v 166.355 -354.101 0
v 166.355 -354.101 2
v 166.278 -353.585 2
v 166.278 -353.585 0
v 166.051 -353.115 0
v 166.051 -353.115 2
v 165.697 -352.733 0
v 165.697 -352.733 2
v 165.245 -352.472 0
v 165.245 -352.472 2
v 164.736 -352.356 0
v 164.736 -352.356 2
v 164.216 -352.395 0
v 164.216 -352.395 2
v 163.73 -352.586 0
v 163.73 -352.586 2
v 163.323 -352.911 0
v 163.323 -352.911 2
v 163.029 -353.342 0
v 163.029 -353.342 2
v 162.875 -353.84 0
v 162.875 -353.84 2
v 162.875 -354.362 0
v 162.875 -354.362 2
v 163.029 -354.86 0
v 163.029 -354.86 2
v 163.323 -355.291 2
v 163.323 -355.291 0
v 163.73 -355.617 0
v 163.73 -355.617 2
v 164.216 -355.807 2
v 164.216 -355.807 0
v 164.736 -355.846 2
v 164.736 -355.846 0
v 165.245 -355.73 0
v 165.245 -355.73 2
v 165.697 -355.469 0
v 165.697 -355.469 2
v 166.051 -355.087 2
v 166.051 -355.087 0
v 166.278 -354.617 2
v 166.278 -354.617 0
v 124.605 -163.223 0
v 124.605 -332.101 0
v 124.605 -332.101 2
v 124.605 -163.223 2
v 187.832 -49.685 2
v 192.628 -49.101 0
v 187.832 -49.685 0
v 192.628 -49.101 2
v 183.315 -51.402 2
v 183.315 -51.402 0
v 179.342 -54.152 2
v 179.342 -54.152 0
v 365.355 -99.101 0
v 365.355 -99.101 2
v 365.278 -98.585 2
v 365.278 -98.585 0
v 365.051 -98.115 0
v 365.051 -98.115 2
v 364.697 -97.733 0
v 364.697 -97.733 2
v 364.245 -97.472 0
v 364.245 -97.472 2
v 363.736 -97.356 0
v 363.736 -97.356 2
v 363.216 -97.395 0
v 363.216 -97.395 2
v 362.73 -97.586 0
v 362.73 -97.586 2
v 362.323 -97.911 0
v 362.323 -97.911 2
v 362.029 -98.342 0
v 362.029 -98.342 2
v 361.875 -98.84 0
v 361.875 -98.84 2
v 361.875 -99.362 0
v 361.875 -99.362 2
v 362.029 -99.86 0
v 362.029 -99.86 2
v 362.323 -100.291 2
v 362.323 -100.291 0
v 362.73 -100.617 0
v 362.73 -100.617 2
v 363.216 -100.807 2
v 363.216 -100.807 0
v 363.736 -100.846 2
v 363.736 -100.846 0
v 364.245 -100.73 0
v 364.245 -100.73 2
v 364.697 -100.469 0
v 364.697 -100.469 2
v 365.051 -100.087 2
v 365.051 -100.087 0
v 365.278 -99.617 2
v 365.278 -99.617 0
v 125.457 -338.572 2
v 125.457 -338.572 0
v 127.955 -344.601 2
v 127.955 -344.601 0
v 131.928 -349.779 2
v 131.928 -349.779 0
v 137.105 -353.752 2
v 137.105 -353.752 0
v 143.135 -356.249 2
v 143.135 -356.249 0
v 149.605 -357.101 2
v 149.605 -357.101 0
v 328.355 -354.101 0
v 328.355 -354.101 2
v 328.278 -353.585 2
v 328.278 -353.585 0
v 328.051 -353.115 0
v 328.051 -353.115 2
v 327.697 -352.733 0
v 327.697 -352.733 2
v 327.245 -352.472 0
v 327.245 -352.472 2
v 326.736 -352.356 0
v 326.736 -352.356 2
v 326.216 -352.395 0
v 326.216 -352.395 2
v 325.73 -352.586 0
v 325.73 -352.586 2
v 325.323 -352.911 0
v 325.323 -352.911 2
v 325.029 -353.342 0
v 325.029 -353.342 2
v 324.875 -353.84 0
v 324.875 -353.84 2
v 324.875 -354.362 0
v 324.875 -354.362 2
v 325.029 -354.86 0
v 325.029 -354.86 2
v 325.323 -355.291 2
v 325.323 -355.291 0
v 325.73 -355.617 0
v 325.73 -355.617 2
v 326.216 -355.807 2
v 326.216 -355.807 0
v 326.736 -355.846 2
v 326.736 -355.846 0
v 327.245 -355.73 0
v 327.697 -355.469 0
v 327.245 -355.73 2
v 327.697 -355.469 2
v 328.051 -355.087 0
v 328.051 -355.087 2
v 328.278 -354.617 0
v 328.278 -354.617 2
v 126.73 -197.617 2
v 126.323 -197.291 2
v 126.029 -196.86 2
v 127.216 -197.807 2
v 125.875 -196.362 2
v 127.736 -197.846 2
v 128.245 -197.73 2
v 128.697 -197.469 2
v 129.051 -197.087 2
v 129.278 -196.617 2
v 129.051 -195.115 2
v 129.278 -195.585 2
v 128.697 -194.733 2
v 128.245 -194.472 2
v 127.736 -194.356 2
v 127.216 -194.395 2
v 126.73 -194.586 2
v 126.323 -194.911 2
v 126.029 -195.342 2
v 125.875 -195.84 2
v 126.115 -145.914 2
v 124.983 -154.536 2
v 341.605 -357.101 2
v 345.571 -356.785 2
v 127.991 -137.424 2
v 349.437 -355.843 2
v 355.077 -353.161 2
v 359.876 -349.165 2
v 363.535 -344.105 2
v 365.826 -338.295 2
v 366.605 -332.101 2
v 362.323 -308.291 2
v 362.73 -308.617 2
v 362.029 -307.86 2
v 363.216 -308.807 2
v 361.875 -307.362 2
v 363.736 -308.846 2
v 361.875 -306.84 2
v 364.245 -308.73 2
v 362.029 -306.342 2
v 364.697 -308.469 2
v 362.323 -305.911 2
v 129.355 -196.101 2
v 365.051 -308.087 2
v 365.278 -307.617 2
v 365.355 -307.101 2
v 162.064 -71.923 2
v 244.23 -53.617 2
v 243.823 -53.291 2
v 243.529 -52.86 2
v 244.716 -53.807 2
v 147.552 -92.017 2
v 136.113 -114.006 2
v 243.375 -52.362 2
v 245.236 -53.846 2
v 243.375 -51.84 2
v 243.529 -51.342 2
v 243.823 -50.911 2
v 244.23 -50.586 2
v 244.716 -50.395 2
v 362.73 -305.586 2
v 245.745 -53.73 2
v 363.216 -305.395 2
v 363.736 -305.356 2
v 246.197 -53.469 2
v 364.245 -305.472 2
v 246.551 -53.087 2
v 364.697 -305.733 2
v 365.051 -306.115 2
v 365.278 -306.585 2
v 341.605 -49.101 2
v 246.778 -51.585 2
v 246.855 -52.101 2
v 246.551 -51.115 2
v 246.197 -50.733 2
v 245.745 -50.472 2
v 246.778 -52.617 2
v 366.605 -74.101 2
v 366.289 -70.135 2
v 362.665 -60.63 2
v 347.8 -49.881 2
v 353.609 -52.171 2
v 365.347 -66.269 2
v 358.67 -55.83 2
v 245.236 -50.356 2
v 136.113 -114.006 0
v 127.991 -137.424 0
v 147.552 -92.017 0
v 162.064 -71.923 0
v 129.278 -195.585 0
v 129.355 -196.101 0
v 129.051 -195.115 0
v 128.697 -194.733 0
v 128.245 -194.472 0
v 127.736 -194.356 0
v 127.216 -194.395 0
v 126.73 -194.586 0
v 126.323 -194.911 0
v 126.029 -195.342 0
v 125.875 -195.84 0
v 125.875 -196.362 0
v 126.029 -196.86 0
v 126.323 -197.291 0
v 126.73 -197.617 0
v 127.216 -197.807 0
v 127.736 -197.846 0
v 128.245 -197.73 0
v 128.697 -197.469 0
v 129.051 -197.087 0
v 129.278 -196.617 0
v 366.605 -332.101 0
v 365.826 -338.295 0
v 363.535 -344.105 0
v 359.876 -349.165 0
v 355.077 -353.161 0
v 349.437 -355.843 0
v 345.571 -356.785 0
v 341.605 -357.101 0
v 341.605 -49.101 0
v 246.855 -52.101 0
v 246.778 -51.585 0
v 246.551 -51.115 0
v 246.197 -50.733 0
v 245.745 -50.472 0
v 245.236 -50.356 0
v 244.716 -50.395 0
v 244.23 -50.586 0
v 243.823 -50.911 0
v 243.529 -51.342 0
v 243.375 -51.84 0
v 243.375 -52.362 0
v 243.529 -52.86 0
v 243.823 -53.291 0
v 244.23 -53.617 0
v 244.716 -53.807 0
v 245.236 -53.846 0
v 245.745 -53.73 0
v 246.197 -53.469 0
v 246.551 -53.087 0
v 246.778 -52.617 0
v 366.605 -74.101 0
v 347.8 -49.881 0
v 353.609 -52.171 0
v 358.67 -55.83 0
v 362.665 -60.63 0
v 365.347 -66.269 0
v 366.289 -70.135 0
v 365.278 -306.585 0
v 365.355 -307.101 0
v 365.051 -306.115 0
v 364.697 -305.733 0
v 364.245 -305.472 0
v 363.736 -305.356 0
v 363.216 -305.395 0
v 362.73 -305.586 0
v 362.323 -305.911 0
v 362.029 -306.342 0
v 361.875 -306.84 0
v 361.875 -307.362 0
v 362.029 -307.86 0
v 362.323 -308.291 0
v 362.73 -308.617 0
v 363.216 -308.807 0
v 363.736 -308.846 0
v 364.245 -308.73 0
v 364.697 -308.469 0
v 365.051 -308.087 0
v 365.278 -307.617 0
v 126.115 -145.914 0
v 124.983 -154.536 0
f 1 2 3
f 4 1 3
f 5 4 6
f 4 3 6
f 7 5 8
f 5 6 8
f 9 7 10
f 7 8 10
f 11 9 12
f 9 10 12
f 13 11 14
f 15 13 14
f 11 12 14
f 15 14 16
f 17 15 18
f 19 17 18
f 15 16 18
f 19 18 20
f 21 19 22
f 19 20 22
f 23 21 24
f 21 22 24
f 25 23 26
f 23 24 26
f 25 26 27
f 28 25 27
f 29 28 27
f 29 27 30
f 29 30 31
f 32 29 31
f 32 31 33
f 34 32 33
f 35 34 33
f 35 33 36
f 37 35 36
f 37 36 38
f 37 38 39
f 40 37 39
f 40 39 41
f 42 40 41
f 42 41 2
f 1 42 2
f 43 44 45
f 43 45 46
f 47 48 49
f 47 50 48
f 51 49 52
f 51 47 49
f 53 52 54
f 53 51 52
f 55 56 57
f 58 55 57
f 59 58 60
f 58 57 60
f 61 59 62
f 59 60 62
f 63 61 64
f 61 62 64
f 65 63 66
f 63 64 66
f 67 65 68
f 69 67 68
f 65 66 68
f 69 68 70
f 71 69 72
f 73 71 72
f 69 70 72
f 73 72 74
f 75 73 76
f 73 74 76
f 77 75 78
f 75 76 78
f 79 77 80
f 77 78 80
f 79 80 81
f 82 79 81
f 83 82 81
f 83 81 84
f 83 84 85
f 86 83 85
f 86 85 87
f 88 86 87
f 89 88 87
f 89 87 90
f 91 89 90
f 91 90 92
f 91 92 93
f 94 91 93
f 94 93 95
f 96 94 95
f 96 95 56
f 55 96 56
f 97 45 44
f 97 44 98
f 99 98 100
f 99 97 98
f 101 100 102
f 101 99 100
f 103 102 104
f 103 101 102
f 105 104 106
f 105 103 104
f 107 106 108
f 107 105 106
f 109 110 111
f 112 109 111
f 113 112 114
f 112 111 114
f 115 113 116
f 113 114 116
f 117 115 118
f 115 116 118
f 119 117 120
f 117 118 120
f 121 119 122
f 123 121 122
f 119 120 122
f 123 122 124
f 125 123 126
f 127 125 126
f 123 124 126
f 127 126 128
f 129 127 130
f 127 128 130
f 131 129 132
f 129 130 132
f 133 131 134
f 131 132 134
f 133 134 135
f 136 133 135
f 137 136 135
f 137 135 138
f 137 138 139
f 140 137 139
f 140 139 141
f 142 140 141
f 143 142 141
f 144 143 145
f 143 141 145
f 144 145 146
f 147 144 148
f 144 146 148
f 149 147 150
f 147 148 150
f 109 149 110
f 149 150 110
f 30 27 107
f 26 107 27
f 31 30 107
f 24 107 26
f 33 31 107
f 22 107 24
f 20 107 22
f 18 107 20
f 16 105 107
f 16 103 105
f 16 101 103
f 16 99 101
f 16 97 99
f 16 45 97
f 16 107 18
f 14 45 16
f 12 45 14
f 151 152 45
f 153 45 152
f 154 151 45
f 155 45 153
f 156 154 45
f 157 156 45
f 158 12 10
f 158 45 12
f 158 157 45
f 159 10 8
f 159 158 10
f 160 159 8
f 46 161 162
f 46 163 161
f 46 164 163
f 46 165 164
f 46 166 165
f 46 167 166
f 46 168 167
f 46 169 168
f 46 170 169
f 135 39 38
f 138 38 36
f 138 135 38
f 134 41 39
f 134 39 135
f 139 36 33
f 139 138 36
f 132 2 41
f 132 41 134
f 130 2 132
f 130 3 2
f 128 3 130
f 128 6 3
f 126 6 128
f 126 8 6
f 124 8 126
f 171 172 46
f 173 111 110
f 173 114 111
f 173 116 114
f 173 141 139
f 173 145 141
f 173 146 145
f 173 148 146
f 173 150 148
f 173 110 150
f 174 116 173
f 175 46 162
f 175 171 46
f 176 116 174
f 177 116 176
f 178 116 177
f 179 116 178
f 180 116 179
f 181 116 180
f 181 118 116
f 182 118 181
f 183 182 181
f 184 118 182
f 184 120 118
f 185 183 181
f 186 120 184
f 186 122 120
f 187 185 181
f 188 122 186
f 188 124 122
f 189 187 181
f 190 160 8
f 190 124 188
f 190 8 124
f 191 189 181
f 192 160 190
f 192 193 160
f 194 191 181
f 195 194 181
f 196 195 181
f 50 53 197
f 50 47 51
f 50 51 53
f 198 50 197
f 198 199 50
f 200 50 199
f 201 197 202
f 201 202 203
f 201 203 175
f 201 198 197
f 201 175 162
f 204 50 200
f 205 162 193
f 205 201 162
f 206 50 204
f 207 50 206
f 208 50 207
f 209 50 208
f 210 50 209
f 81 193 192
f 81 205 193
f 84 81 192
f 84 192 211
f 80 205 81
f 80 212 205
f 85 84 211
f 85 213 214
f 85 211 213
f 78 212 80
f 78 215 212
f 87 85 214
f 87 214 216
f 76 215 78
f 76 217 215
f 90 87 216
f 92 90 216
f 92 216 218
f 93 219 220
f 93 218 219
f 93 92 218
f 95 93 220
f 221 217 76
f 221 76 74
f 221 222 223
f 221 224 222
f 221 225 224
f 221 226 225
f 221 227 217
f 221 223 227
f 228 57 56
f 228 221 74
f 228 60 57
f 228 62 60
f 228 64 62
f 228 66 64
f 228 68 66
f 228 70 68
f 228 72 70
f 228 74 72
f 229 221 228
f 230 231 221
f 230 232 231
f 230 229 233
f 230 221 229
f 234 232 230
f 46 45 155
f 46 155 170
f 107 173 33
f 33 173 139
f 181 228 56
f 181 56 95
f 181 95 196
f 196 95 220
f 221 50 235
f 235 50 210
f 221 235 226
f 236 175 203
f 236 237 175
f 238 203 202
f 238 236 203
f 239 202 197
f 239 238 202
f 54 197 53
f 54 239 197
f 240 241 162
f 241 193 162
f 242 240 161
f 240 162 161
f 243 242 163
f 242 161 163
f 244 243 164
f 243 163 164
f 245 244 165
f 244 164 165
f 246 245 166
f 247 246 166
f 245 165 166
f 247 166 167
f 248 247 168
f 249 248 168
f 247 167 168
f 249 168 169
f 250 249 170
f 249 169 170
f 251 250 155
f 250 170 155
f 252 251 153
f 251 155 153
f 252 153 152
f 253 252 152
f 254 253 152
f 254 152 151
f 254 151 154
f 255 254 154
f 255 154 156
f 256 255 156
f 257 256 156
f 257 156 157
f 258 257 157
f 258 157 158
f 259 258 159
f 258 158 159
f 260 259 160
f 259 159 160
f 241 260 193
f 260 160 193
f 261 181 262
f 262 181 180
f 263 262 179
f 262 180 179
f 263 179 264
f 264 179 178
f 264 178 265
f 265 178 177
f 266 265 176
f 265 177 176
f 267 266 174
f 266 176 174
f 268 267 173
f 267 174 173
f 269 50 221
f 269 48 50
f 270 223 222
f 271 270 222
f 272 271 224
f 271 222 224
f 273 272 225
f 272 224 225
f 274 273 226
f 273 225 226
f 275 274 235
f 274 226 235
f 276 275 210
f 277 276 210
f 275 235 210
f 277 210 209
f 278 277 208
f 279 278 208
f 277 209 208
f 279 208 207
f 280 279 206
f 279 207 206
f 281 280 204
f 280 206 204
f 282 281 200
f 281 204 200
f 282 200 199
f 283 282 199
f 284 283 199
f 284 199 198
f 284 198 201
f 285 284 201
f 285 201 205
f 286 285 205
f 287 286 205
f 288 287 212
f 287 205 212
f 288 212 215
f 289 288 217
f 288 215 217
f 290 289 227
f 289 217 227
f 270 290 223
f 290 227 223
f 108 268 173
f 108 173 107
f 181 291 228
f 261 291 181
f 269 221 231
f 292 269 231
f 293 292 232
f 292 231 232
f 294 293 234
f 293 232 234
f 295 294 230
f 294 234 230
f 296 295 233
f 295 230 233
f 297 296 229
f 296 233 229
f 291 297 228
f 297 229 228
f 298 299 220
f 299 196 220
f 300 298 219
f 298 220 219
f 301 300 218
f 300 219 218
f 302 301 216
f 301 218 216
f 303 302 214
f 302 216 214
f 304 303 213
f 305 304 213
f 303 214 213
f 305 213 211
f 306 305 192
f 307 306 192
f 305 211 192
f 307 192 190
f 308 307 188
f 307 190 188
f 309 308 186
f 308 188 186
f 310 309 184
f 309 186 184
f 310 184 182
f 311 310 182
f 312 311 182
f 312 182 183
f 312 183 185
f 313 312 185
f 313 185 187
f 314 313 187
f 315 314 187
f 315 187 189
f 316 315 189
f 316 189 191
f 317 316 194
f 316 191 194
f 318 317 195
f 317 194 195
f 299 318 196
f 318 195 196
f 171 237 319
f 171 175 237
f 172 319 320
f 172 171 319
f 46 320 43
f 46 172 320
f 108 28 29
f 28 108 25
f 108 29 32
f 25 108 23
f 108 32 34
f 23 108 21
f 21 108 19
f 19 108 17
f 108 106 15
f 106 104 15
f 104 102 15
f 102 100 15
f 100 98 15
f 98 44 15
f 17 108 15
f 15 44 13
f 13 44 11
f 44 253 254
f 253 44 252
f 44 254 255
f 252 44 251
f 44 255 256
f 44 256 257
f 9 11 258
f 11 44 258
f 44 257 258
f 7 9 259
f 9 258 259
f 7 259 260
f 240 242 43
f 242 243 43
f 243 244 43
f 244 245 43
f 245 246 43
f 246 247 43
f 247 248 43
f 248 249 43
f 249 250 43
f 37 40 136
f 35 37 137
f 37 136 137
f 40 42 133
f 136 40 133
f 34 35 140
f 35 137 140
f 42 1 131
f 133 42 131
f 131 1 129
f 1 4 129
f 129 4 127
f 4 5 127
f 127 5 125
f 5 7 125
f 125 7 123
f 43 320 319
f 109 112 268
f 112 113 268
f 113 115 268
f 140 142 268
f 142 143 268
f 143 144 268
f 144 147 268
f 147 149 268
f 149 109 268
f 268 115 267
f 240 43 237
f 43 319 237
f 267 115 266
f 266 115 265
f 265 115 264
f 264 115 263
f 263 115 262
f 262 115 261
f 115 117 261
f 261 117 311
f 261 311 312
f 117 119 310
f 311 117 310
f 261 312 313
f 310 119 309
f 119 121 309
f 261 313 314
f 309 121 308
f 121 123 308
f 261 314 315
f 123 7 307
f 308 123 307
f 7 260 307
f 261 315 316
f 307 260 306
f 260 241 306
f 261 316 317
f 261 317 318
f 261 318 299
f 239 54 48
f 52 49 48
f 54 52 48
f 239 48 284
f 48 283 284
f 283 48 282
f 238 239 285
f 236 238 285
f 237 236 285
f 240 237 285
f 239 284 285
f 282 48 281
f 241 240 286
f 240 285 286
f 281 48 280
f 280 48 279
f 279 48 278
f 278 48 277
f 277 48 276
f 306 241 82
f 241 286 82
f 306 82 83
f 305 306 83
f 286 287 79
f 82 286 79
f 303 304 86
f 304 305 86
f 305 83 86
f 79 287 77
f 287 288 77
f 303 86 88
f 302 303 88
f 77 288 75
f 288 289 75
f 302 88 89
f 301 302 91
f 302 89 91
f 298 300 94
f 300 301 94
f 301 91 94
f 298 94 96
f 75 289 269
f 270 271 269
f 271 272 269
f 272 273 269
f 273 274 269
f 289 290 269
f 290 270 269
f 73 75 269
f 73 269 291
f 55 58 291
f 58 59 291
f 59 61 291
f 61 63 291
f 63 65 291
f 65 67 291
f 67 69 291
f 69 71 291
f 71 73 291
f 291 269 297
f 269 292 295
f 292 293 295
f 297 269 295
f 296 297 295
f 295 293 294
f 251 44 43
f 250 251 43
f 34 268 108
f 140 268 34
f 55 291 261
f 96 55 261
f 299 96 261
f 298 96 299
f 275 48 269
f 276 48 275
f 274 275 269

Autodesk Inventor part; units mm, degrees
ref_plane "YZ Plane" through (0, 0, 0) normal (1, 0, 0) x (0, 1, 0)
ref_plane "XZ Plane" through (0, 0, 0) normal (0, 1, 0) x (-1, 0, 0)
ref_plane "XY Plane" through (0, 0, 0) normal (0, 0, 1) x (1, 0, 0)
sketch "Boceto1" plane through (0, 0, 0) normal (0, 0, 1) x (1, 0, 0)
  line L0 (200.6138, -49.1011) -> (347.0892, -49.1011)
  line L1 (366.6054, -71.1) -> (366.6054, -332.1)
  line L2 (352.0892, -357.1011) -> (151.6064, -357.1011)
  line L3 (124.6054, -332.1) -> (124.6054, -152.9933)
  line L4 (366.6054, -332.1) -> (366.6054, -357.1011)
  line L5 (352.0892, -357.1011) -> (366.6054, -357.1011)
  line L6 (347.0892, -49.1011) -> (366.6054, -49.1011)
  line L7 (366.6054, -71.1) -> (366.6054, -49.1011)
  line L8 (151.6064, -357.1011) -> (124.6054, -357.1011)
  line L9 (124.6054, -332.1) -> (124.6054, -357.1011)
  line L10 (200.6138, -49.1011) -> (185.295, -49.1011)
  arc A0 (185.295, -49.1011) -> (124.6054, -152.9933) centre (292.3571, -181.3147) ccw
  dimension "d2" = 308
  dimension "d3" = 242
extrude "Extrusión2" add sketch "Boceto1" along normal blind 2
fillet "Empalme1" radius 25 3 edges at (366.6054, -49.1011, 1) (366.6054, -357.1011, 1) (124.6054, -357.1011, 1)
sketch "Boceto3" plane through (0, 0, 2) normal (0, 0, 1) x (1, 0, 0)
  line L0 (341.6054, -357.1011) -> (149.6054, -357.1011) projected
  line L1 (366.6054, -74.1011) -> (366.6054, -332.1011) projected
  line L2 (185.295, -49.1011) -> (341.6054, -49.1011) projected
  line L3 (124.6054, -332.1011) -> (124.6054, -152.9933) projected
  circle A0 centre (164.6054, -354.1011) radius 1.75
  circle A1 centre (326.6054, -354.1011) radius 1.75
  circle A2 centre (127.6054, -196.1011) radius 1.75
  circle A3 centre (363.6054, -307.1011) radius 1.75
  circle A4 centre (363.6054, -99.1011) radius 1.75
  circle A5 centre (245.1054, -52.1011) radius 1.75
  point P0 (200.6138, -49.1011)
  point P1 (0, 0)
  dimension "d7" = 3.5
  dimension "d8" = 3.5
  dimension "d9" = 3.5
  dimension "d10" = 3.5
  dimension "d11" = 3.5
  dimension "d12" = 3.5
  dimension "d13" = 3
  dimension "d14" = 3
  dimension "d15" = 3
  dimension "d16" = 3
  dimension "d17" = 3
  dimension "d18" = 3
  dimension "d19" = 121.5
  dimension "d20" = 161
  dimension "d21" = 50
  dimension "d22" = 50
  dimension "d23" = 40
  dimension "d24" = 40
extrude "Extrusión3" cut sketch "Boceto3" against normal blind 2
fillet "Empalme2" radius 20 1 edges at (185.295, -49.1011, 1)
fillet "Empalme3" radius 100 1 edges at (124.6054, -152.9933, 1)
equation "\"d14\" = d13"
equation "\"d15\" = d13"
equation "\"d16\" = d13"
equation "\"d17\" = d13"
equation "\"d18\" = d13"
properties part number "metacrilat proteccio dret"
